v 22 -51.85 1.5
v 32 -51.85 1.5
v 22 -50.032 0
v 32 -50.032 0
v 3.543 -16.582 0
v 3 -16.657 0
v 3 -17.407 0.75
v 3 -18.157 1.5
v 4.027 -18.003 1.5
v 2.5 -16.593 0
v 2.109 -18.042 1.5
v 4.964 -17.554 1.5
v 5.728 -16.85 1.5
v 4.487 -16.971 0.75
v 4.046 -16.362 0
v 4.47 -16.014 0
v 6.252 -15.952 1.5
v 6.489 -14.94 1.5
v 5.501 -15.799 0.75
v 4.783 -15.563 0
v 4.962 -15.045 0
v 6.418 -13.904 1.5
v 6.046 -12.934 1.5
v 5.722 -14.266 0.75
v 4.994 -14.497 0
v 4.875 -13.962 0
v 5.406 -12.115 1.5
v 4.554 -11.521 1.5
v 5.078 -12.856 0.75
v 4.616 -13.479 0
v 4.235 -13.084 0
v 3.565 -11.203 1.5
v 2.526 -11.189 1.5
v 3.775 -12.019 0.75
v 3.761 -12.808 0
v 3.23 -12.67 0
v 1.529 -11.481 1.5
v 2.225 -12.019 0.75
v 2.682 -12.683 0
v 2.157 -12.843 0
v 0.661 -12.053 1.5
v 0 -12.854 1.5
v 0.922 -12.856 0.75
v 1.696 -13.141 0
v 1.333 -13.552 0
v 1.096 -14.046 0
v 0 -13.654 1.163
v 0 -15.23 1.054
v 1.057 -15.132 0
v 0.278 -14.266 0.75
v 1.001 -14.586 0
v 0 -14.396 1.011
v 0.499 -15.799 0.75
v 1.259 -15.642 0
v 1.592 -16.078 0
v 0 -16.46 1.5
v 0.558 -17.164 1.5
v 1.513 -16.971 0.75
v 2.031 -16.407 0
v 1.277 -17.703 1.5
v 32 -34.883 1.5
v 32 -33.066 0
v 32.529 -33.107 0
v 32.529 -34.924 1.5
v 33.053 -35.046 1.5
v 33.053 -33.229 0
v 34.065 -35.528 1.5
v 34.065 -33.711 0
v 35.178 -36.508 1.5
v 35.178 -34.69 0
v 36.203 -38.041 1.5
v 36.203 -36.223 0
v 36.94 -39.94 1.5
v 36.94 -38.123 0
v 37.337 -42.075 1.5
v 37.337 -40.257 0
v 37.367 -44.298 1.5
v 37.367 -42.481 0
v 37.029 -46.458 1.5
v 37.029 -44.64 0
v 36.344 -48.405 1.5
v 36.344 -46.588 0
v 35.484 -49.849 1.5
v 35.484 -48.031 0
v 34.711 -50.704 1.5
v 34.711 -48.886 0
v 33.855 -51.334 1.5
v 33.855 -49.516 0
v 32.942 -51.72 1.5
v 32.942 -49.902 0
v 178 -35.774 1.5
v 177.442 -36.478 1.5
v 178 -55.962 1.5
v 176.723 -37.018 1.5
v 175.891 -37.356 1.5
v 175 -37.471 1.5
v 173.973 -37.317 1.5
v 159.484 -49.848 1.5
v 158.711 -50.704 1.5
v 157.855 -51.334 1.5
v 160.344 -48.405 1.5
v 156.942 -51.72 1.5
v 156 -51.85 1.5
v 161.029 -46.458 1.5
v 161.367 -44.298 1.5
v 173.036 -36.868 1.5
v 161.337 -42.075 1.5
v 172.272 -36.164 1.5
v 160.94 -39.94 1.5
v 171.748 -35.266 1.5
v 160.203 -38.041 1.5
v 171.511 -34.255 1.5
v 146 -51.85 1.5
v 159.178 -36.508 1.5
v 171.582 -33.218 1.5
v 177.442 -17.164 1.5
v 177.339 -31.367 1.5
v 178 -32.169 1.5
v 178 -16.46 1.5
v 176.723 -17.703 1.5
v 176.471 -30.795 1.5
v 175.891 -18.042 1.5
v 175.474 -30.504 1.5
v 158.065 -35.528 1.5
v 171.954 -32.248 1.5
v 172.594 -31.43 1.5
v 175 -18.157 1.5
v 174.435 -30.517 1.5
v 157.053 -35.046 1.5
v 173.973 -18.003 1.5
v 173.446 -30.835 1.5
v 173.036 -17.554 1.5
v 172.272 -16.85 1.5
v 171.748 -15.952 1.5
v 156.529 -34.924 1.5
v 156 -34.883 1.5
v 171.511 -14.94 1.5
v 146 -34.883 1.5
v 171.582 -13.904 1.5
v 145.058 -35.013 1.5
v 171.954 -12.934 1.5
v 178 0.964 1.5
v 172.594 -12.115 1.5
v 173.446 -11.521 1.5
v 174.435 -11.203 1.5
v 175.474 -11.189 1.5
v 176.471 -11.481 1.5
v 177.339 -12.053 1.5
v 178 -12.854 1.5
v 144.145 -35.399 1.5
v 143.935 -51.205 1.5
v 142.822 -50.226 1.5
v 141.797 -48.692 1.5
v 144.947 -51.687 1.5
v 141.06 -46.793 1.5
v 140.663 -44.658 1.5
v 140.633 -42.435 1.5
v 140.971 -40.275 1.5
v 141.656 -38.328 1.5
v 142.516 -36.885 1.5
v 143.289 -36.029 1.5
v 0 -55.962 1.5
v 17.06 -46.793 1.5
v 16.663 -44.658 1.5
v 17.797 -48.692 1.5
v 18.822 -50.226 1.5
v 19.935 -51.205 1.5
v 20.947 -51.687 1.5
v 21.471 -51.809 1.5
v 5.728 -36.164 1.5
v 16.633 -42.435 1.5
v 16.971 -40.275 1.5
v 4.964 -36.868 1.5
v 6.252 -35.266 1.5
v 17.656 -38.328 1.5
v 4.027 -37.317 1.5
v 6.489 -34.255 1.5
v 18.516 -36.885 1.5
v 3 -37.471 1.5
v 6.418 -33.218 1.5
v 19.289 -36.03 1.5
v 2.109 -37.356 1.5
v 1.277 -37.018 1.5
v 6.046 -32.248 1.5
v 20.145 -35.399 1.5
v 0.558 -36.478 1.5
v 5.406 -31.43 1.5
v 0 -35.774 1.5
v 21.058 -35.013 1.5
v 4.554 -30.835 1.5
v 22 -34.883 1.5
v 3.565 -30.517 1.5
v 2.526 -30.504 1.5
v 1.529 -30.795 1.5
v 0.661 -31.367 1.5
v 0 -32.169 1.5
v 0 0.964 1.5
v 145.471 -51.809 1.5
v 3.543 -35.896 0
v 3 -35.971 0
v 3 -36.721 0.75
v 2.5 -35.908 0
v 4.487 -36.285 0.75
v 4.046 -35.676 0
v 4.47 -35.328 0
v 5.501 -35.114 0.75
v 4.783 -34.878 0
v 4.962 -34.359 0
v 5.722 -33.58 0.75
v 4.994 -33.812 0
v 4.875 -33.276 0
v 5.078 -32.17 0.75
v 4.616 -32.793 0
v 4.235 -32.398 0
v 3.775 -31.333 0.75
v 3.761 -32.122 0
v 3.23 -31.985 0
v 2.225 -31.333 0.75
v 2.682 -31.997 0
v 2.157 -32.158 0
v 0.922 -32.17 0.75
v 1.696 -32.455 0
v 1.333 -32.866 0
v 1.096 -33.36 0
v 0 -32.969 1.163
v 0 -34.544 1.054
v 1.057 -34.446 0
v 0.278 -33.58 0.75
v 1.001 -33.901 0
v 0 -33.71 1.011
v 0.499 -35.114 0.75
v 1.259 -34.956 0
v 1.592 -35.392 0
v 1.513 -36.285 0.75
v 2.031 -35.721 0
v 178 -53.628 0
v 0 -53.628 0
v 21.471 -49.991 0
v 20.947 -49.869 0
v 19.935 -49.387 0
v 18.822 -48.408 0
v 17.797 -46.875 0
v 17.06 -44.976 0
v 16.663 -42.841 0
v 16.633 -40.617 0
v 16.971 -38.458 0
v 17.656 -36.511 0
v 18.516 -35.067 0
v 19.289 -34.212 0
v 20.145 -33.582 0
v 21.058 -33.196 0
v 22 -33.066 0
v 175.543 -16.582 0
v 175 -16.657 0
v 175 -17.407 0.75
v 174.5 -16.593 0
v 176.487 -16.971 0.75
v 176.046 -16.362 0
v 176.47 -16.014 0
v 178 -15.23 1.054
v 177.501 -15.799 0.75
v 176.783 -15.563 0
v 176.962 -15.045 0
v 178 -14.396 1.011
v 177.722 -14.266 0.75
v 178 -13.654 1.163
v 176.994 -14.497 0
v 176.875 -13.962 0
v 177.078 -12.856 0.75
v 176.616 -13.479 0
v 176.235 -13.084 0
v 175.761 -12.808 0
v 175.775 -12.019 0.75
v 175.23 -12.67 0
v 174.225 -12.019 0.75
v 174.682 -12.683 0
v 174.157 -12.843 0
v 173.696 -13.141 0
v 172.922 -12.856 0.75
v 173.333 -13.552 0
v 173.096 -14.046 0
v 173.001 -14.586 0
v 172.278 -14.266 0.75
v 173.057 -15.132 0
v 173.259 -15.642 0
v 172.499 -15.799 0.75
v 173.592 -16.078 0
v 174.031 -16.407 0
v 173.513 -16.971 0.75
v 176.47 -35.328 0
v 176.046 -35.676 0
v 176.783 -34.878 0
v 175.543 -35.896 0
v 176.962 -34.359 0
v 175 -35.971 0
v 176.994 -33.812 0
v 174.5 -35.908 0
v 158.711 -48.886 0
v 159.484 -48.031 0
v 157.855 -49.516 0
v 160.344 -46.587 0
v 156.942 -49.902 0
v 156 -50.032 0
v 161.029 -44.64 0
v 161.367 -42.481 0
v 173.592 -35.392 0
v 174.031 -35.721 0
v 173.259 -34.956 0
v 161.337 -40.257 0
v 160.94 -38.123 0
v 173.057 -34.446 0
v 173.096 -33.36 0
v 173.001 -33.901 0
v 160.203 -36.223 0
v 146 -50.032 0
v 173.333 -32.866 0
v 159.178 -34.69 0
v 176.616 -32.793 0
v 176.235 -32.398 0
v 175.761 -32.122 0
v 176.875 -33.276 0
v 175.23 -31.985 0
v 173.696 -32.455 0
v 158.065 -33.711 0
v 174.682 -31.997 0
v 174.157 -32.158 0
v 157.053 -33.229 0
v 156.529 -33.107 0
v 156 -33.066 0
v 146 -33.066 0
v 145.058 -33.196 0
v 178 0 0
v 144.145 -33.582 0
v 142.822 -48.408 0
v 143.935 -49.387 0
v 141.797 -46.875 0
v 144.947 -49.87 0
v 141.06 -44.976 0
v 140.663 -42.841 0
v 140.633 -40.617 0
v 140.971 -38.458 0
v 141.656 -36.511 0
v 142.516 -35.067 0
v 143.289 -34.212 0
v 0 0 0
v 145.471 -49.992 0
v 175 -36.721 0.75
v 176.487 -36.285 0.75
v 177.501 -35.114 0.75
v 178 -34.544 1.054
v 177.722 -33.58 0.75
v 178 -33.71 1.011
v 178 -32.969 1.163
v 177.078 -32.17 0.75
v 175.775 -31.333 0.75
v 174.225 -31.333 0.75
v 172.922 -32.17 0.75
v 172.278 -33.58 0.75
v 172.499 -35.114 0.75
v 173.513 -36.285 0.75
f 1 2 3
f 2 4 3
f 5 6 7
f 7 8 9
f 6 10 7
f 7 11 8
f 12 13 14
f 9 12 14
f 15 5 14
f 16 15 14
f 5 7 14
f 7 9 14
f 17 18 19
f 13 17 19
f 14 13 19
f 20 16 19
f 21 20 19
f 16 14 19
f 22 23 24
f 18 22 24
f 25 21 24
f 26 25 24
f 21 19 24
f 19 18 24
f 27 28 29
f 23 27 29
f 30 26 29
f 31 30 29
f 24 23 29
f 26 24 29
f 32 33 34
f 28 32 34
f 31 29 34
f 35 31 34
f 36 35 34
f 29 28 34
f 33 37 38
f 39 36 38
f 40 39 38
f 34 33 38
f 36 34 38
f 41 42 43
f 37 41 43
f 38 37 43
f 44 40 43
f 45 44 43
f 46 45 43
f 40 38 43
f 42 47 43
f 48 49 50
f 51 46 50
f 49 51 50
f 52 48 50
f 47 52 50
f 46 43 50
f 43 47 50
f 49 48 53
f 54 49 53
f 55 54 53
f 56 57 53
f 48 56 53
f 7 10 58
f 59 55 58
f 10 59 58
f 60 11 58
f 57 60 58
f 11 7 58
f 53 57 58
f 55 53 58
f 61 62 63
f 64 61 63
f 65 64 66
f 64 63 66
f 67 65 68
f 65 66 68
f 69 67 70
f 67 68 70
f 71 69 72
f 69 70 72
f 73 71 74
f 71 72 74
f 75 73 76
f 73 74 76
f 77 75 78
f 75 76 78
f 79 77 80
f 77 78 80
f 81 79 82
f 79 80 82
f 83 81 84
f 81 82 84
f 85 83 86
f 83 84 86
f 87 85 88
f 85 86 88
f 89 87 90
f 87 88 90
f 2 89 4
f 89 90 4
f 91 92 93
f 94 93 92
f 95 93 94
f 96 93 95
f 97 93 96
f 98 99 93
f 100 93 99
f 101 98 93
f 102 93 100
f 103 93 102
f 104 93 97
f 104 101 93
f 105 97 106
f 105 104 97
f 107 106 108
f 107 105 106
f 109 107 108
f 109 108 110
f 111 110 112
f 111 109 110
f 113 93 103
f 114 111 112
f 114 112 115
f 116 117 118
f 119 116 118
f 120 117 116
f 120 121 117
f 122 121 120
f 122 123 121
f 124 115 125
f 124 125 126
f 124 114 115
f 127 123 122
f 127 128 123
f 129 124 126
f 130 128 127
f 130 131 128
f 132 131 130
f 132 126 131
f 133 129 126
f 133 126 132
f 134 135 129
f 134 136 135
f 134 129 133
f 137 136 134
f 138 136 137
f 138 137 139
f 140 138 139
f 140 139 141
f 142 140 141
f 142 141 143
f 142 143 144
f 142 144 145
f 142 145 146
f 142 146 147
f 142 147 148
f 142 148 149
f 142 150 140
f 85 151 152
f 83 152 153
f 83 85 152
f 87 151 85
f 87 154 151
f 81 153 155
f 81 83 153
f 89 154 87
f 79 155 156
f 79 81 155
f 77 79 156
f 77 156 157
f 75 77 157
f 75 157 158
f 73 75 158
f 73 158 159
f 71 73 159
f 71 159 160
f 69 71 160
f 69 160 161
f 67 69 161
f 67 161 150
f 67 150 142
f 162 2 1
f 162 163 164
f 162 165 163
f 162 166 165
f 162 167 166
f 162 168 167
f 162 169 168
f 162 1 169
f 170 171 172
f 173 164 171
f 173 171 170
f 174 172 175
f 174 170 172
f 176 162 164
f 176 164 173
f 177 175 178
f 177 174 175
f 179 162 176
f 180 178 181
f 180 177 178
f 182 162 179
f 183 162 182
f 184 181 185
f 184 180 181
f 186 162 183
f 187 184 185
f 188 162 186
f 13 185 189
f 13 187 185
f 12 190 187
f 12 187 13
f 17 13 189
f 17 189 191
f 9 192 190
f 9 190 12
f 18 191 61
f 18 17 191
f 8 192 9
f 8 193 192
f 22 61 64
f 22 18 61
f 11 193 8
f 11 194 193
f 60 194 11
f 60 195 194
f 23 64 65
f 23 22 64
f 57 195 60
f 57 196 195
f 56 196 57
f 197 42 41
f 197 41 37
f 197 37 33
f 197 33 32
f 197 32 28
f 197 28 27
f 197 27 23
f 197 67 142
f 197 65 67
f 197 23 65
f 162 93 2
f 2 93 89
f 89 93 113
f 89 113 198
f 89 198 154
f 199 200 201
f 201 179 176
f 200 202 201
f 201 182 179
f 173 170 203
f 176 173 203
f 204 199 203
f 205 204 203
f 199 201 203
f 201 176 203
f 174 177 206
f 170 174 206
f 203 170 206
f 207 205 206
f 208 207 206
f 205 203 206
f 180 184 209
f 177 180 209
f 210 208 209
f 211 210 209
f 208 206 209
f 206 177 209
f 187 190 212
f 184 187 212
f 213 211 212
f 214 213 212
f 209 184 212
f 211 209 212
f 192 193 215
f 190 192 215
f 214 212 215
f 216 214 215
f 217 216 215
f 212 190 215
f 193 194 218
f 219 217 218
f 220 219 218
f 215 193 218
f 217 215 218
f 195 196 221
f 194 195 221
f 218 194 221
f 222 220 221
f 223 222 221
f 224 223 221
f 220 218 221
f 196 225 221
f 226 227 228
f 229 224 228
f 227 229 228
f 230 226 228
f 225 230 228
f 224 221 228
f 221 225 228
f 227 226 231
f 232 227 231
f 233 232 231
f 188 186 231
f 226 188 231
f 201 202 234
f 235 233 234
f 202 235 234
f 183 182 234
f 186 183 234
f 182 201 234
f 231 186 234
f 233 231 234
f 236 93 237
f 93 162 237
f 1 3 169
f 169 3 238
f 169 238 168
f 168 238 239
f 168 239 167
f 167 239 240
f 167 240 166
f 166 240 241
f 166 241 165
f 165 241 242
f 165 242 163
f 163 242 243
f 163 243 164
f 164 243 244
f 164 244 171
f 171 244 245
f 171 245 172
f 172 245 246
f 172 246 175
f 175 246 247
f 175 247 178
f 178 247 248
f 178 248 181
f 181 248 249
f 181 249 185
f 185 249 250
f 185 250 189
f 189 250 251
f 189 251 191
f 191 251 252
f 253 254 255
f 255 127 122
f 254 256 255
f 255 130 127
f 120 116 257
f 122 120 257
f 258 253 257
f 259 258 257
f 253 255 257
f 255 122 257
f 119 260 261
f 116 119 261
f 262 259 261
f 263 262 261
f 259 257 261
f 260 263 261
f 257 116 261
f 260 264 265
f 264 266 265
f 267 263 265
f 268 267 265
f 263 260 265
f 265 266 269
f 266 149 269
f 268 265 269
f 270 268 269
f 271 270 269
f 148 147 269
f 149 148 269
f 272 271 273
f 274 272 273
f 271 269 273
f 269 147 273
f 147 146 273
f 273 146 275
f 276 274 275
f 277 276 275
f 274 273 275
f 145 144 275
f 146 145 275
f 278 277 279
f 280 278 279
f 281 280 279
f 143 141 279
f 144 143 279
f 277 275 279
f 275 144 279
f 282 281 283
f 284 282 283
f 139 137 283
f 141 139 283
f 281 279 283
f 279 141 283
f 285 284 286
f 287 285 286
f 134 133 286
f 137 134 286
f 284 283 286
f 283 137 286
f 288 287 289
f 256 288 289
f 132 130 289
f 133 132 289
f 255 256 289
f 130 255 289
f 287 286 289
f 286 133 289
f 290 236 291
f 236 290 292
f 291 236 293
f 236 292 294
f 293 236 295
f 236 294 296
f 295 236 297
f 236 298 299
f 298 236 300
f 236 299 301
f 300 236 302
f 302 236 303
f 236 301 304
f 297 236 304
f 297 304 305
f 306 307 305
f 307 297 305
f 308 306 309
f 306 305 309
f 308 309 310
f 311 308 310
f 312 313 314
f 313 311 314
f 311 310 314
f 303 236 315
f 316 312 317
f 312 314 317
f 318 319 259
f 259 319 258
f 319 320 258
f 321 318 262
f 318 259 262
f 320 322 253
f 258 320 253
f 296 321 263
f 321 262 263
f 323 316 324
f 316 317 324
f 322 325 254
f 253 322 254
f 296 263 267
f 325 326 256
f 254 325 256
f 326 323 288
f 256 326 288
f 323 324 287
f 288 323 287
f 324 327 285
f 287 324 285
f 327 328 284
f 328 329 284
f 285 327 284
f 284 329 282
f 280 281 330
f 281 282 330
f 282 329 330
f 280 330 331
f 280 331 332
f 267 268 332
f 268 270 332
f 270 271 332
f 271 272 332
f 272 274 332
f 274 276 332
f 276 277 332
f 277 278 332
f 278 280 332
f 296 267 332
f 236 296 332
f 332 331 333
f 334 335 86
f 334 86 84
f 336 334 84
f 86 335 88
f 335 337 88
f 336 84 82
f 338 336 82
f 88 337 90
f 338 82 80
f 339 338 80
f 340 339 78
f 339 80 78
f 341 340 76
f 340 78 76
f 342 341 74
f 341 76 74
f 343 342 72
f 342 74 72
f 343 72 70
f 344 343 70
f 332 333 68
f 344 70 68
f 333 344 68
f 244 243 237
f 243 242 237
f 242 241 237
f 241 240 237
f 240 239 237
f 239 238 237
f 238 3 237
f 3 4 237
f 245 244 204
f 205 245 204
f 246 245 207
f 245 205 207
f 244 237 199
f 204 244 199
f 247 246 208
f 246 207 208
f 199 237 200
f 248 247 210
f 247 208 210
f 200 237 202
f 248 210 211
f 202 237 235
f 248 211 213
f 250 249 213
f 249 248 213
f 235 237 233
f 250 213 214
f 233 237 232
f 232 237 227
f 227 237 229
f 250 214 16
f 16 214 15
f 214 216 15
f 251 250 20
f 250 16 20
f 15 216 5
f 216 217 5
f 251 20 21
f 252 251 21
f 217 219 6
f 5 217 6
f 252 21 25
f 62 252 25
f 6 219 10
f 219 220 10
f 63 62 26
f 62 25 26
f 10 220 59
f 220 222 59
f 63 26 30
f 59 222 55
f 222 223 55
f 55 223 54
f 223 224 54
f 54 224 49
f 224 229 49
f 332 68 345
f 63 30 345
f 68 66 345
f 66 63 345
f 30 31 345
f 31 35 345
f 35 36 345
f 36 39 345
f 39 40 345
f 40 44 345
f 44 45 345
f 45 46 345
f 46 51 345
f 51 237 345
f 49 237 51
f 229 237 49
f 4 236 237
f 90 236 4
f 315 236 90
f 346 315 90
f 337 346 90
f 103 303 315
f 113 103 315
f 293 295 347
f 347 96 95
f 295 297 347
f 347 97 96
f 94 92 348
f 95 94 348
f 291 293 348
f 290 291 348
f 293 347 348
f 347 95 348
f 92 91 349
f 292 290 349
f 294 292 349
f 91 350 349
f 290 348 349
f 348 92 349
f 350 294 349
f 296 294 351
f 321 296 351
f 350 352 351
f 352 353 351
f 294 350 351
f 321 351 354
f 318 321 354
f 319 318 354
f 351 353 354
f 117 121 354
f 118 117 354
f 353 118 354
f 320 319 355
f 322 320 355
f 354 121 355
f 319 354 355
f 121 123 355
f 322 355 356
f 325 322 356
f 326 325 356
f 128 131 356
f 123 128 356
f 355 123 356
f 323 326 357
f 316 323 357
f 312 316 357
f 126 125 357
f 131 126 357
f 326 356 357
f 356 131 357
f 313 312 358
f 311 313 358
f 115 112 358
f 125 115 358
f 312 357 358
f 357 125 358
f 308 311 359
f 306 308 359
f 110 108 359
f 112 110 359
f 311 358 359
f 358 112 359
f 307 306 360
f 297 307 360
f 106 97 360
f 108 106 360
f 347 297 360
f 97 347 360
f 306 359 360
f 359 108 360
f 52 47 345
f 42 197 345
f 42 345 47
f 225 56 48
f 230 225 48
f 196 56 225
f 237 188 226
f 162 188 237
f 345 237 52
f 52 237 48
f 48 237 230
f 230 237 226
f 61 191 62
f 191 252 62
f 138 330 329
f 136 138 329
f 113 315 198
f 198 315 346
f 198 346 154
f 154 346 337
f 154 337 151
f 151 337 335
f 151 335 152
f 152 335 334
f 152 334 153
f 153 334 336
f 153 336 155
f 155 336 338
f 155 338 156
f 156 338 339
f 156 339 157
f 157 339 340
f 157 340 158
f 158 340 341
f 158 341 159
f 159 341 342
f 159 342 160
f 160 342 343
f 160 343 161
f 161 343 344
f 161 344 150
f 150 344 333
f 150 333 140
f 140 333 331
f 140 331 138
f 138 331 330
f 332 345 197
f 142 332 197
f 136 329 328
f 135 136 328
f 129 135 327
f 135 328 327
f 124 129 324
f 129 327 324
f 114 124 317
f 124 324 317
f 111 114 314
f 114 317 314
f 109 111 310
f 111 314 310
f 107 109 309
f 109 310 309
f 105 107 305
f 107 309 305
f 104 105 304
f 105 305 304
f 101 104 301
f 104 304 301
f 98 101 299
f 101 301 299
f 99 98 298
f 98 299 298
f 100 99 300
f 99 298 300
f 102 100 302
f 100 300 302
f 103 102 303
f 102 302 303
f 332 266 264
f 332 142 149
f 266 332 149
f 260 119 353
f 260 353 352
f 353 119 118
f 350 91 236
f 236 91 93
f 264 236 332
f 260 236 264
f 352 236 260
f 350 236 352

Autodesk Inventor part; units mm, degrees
ref_plane "YZ Plane" through (0, 0, 0) normal (1, 0, 0) x (0, 1, 0)
ref_plane "XZ Plane" through (0, 0, 0) normal (0, 1, 0) x (-1, 0, 0)
ref_plane "Work Plane1" through (0, 4.7283, -22.9522) normal (-1, 0, 0) x (0, -0.8411785, 0.5407576)
sketch "Sketch1" plane through (0, 4.7283, -22.9522) normal (-1, 0, 0) x (0, -0.8411785, 0.5407576)
  line L0 (-34.301, -16.75) -> (61.5, -16.75) projected
  line L1 (61.5, -12.25) -> (61.5, -16.75) projected
  line L2 (61.5, -16.75) -> (65.5, -16.75) projected
  line L3 (65.5, -16.75) -> (65.5, -20.25) projected
  line L4 (65.5, -20.25) -> (79.5, -20.25) projected
  line L5 (79.5, -20.25) -> (65.5, -11.25) projected
  line L6 (65.5, -11.25) -> (65.5, -12.25) projected
  line L7 (65.5, -12.25) -> (61.5, -12.25) projected
  line L8 (16.3889, 16.75) -> (16.3889, 18.75) projected
  line L9 (14.3494, 18.75) -> (16.3889, 18.75)
  line L10 (64.2739, -12.25) -> (12.3502, 21.1295)
  line L11 (16.3889, 16.75) -> (16.3889, 18.5332)
  arc A0 (-57.551, -16.75) -> (-61.5, -12.801) centre (-58.75, -14) ccw projected
  line L12 (-57.551, -16.75) -> (-36.699, -16.75) projected
  arc A1 (-34.301, -16.75) -> (-36.699, -16.75) centre (-35.5, -14) ccw projected
  line L13 (-34.301, -16.75) -> (61.5, -16.75) projected
  line L14 (61.5, -16.75) -> (61.5, -12.25) projected
  line L15 (61.5, -12.25) -> (16.3889, 16.75) projected
  line L16 (16.3889, 16.75) -> (-61.5, 16.75) projected
  line L17 (-61.5, 16.75) -> (-61.5, -12.801) projected
  line L18 (-61.5, 16.75) -> (-61.5, -12.801) projected
  arc A2 (-57.551, -16.75) -> (-61.5, -12.801) centre (-58.75, -14) ccw projected
  line L19 (-57.551, -16.75) -> (-36.699, -16.75) projected
  arc A3 (-34.301, -16.75) -> (-36.699, -16.75) centre (-35.5, -14) ccw projected
  line L20 (61.5, -16.75) -> (61.5, -12.25) projected
  line L21 (61.5, -12.25) -> (16.3889, 16.75) projected
  line L22 (16.3889, 16.75) -> (-61.5, 16.75) projected
  point P0 (16.3889, 18.5332)
  point P1 (15.3691, 18.75)
  point P2 (16.3889, 18.5332)
  point P3 (16.0517, 18.75)
  dimension "d14" = 1.5
  dimension "d15" = 2
ref_plane "Work Plane2" through (178, -56.0619, -70.2985) normal (1, 0, 0) x (0, 0.8411785, -0.5407576)
extrude "Extrusion1" add sketch "Sketch1" against normal up to surface (178 mm away) contours L15 L8 L10 L7
sketch "Sketch2" plane through (0, -55.9618, 1.5) normal (0, 0, 1) x (1, 0, 0)
  circle A0 centre (3, 21.9904) radius 2.5 projected
  circle A1 centre (3, 41.3047) radius 2.5 projected
  line L0 (0, 2.3333) -> (0, 55.9618) projected
  line L1 (0, 2.3333) -> (6, 2.3333) projected
  line L2 (6, 55.9618) -> (6, 2.3333) projected
  line L3 (0, 55.9618) -> (6, 55.9618) projected
  circle A2 centre (175, 21.9904) radius 2.5 projected
  circle A3 centre (175, 41.3047) radius 2.5 projected
  line L4 (178, 2.3333) -> (178, 55.9618) projected
  line L5 (178, 55.9618) -> (172, 55.9618) projected
  line L6 (172, 55.9618) -> (172, 2.3333) projected
  line L7 (178, 2.3333) -> (172, 2.3333) projected
hole "Hole1" at (3, -14.6571, 1.5) at (3, -33.9713, 1.5) at (175, -33.9713, 1.5) at (175, -14.6571, 1.5) direction (0, 0, -1) diameter 3.6 end through all countersink diameter 7 countersink angle 90 clearance for "Countersunk Flat Head Screw ISO 2009/7046" size "M3" standard "ISO"
ref_plane "Work Plane3" through (22, -30.5397, -9.0869) normal (0, -0.7712334, 0.6365525) x (1, 0, 0)
sketch "Sketch3" plane through (22, -30.5397, -9.0869) normal (0, -0.7712334, 0.6365525) x (1, 0, 0)
  line L0 (-9.9215, 5.4518) -> (-9.9215, -5.4534)
  spline S0 degree 3 poles (-9.9215, -5.4534) (-9.9222, -5.5772) (-9.8204, -5.8209) (-9.5772, -5.9222) (-9.4534, -5.9215) knots 0 0 0 0 0.5 1 1 1 1
  line L1 (-9.4534, -5.9215) -> (19.4534, -5.9215)
  spline S1 degree 3 poles (19.4534, -5.9215) (19.5775, -5.9222) (19.8219, -5.82) (19.9222, -5.5758) (19.9215, -5.4518) knots 0 0 0 0 0.5 1 1 1 1
  line L2 (19.9215, -5.4518) -> (19.9215, 5.4534)
  spline S2 degree 3 poles (19.9215, 5.4534) (19.9222, 5.5775) (19.82, 5.8219) (19.5758, 5.9222) (19.4518, 5.9215) knots 0 0 0 0 0.5 1 1 1 1
  line L3 (19.4518, 5.9215) -> (-9.4534, 5.9215)
  spline S3 degree 3 poles (-9.4534, 5.9215) (-9.5775, 5.9222) (-9.8219, 5.82) (-9.9222, 5.5758) (-9.9215, 5.4518) knots 0 0 0 0 0.5 1 1 1 1
  circle A0 centre (-8.3791, -4.3791) radius 0.5
  circle A1 centre (-8.3791, 4.3791) radius 0.5
  circle A2 centre (18.3791, 4.3791) radius 0.5
  circle A3 centre (18.3791, -4.3791) radius 0.5
  arc A4 (5.2617, -1.4512) -> (5.1811, -1.5218) centre (5.2771, -1.55) ccw
  arc A5 (5.1811, 1.5218) -> (5.1811, -1.5218) centre (0, 0) ccw
  arc A6 (5.1811, 1.5218) -> (5.2617, 1.4512) centre (5.2771, 1.55) ccw
  arc A7 (5.2617, 1.4512) -> (5.3414, 1.519) centre (5.2463, 1.55) ccw
  arc A8 (5.3414, -1.519) -> (5.3414, 1.519) centre (10, 0) ccw
  arc A9 (5.3414, -1.519) -> (5.2617, -1.4512) centre (5.2463, -1.55) ccw
  line L4 (143.9215, 5.4518) -> (143.9215, -5.4534)
  spline S4 degree 3 poles (143.4534, 5.9215) (143.5775, 5.9222) (143.8219, 5.82) (143.9222, 5.5758) (143.9215, 5.4518) knots 0 0 0 0 0.5 1 1 1 1
  line L5 (114.5482, 5.9215) -> (143.4534, 5.9215)
  spline S5 degree 3 poles (114.0785, 5.4534) (114.0778, 5.5775) (114.18, 5.8219) (114.4242, 5.9222) (114.5482, 5.9215) knots 0 0 0 0 0.5 1 1 1 1
  line L6 (114.0785, -5.4518) -> (114.0785, 5.4534)
  spline S6 degree 3 poles (114.5466, -5.9215) (114.4225, -5.9222) (114.1781, -5.82) (114.0778, -5.5758) (114.0785, -5.4518) knots 0 0 0 0 0.5 1 1 1 1
  line L7 (143.4534, -5.9215) -> (114.5466, -5.9215)
  spline S7 degree 3 poles (143.9215, -5.4534) (143.9222, -5.5772) (143.8204, -5.8209) (143.5772, -5.9222) (143.4534, -5.9215) knots 0 0 0 0 0.5 1 1 1 1
  circle A10 centre (142.3791, -4.3791) radius 0.5
  circle A11 centre (142.3791, 4.3791) radius 0.5
  circle A12 centre (115.6209, 4.3791) radius 0.5
  circle A13 centre (115.6209, -4.3791) radius 0.5
  arc A14 (128.8189, -1.5218) -> (128.7383, -1.4512) centre (128.7229, -1.55) ccw
  arc A15 (128.7383, -1.4512) -> (128.6586, -1.519) centre (128.7537, -1.55) ccw
  arc A16 (128.6586, 1.519) -> (128.6586, -1.519) centre (124, 0) ccw
  arc A17 (128.6586, 1.519) -> (128.7383, 1.4512) centre (128.7537, 1.55) ccw
  arc A18 (128.7383, 1.4512) -> (128.8189, 1.5218) centre (128.7229, 1.55) ccw
  arc A19 (128.8189, -1.5218) -> (128.8189, 1.5218) centre (134, 0) ccw
  circle A20 centre (10, 0) radius 5.4
  circle A21 centre (124, 0) radius 5.4
  line L8 (0, 5.4) -> (10, 5.4)
  line L9 (10, -5.4) -> (0, -5.4)
  line L10 (124, 5.4) -> (134, 5.4)
  line L11 (134, -5.4) -> (124, -5.4)
  point P0 (-22, 26.4483)
  dimension "d9" = 10.8
  dimension "d10" = 10.8
extrude "Extrusion2" cut sketch "Sketch3" along normal blind 78.25 contours A9 A8 A7 A6 A5 A20 A4 | A4 A5 A20 A6 A7 A8 A9 | A20 L9 A5 | A5 A20 | A5 L8 A20 | A19 A21 A18 A17 A16 A15 A14 | A14 A15 A16 A17 A18 A19 A21 | A21 A19 | A19 L11 A21 | A19 A21 L10
properties part number "front" material "Aluminum 6061"
